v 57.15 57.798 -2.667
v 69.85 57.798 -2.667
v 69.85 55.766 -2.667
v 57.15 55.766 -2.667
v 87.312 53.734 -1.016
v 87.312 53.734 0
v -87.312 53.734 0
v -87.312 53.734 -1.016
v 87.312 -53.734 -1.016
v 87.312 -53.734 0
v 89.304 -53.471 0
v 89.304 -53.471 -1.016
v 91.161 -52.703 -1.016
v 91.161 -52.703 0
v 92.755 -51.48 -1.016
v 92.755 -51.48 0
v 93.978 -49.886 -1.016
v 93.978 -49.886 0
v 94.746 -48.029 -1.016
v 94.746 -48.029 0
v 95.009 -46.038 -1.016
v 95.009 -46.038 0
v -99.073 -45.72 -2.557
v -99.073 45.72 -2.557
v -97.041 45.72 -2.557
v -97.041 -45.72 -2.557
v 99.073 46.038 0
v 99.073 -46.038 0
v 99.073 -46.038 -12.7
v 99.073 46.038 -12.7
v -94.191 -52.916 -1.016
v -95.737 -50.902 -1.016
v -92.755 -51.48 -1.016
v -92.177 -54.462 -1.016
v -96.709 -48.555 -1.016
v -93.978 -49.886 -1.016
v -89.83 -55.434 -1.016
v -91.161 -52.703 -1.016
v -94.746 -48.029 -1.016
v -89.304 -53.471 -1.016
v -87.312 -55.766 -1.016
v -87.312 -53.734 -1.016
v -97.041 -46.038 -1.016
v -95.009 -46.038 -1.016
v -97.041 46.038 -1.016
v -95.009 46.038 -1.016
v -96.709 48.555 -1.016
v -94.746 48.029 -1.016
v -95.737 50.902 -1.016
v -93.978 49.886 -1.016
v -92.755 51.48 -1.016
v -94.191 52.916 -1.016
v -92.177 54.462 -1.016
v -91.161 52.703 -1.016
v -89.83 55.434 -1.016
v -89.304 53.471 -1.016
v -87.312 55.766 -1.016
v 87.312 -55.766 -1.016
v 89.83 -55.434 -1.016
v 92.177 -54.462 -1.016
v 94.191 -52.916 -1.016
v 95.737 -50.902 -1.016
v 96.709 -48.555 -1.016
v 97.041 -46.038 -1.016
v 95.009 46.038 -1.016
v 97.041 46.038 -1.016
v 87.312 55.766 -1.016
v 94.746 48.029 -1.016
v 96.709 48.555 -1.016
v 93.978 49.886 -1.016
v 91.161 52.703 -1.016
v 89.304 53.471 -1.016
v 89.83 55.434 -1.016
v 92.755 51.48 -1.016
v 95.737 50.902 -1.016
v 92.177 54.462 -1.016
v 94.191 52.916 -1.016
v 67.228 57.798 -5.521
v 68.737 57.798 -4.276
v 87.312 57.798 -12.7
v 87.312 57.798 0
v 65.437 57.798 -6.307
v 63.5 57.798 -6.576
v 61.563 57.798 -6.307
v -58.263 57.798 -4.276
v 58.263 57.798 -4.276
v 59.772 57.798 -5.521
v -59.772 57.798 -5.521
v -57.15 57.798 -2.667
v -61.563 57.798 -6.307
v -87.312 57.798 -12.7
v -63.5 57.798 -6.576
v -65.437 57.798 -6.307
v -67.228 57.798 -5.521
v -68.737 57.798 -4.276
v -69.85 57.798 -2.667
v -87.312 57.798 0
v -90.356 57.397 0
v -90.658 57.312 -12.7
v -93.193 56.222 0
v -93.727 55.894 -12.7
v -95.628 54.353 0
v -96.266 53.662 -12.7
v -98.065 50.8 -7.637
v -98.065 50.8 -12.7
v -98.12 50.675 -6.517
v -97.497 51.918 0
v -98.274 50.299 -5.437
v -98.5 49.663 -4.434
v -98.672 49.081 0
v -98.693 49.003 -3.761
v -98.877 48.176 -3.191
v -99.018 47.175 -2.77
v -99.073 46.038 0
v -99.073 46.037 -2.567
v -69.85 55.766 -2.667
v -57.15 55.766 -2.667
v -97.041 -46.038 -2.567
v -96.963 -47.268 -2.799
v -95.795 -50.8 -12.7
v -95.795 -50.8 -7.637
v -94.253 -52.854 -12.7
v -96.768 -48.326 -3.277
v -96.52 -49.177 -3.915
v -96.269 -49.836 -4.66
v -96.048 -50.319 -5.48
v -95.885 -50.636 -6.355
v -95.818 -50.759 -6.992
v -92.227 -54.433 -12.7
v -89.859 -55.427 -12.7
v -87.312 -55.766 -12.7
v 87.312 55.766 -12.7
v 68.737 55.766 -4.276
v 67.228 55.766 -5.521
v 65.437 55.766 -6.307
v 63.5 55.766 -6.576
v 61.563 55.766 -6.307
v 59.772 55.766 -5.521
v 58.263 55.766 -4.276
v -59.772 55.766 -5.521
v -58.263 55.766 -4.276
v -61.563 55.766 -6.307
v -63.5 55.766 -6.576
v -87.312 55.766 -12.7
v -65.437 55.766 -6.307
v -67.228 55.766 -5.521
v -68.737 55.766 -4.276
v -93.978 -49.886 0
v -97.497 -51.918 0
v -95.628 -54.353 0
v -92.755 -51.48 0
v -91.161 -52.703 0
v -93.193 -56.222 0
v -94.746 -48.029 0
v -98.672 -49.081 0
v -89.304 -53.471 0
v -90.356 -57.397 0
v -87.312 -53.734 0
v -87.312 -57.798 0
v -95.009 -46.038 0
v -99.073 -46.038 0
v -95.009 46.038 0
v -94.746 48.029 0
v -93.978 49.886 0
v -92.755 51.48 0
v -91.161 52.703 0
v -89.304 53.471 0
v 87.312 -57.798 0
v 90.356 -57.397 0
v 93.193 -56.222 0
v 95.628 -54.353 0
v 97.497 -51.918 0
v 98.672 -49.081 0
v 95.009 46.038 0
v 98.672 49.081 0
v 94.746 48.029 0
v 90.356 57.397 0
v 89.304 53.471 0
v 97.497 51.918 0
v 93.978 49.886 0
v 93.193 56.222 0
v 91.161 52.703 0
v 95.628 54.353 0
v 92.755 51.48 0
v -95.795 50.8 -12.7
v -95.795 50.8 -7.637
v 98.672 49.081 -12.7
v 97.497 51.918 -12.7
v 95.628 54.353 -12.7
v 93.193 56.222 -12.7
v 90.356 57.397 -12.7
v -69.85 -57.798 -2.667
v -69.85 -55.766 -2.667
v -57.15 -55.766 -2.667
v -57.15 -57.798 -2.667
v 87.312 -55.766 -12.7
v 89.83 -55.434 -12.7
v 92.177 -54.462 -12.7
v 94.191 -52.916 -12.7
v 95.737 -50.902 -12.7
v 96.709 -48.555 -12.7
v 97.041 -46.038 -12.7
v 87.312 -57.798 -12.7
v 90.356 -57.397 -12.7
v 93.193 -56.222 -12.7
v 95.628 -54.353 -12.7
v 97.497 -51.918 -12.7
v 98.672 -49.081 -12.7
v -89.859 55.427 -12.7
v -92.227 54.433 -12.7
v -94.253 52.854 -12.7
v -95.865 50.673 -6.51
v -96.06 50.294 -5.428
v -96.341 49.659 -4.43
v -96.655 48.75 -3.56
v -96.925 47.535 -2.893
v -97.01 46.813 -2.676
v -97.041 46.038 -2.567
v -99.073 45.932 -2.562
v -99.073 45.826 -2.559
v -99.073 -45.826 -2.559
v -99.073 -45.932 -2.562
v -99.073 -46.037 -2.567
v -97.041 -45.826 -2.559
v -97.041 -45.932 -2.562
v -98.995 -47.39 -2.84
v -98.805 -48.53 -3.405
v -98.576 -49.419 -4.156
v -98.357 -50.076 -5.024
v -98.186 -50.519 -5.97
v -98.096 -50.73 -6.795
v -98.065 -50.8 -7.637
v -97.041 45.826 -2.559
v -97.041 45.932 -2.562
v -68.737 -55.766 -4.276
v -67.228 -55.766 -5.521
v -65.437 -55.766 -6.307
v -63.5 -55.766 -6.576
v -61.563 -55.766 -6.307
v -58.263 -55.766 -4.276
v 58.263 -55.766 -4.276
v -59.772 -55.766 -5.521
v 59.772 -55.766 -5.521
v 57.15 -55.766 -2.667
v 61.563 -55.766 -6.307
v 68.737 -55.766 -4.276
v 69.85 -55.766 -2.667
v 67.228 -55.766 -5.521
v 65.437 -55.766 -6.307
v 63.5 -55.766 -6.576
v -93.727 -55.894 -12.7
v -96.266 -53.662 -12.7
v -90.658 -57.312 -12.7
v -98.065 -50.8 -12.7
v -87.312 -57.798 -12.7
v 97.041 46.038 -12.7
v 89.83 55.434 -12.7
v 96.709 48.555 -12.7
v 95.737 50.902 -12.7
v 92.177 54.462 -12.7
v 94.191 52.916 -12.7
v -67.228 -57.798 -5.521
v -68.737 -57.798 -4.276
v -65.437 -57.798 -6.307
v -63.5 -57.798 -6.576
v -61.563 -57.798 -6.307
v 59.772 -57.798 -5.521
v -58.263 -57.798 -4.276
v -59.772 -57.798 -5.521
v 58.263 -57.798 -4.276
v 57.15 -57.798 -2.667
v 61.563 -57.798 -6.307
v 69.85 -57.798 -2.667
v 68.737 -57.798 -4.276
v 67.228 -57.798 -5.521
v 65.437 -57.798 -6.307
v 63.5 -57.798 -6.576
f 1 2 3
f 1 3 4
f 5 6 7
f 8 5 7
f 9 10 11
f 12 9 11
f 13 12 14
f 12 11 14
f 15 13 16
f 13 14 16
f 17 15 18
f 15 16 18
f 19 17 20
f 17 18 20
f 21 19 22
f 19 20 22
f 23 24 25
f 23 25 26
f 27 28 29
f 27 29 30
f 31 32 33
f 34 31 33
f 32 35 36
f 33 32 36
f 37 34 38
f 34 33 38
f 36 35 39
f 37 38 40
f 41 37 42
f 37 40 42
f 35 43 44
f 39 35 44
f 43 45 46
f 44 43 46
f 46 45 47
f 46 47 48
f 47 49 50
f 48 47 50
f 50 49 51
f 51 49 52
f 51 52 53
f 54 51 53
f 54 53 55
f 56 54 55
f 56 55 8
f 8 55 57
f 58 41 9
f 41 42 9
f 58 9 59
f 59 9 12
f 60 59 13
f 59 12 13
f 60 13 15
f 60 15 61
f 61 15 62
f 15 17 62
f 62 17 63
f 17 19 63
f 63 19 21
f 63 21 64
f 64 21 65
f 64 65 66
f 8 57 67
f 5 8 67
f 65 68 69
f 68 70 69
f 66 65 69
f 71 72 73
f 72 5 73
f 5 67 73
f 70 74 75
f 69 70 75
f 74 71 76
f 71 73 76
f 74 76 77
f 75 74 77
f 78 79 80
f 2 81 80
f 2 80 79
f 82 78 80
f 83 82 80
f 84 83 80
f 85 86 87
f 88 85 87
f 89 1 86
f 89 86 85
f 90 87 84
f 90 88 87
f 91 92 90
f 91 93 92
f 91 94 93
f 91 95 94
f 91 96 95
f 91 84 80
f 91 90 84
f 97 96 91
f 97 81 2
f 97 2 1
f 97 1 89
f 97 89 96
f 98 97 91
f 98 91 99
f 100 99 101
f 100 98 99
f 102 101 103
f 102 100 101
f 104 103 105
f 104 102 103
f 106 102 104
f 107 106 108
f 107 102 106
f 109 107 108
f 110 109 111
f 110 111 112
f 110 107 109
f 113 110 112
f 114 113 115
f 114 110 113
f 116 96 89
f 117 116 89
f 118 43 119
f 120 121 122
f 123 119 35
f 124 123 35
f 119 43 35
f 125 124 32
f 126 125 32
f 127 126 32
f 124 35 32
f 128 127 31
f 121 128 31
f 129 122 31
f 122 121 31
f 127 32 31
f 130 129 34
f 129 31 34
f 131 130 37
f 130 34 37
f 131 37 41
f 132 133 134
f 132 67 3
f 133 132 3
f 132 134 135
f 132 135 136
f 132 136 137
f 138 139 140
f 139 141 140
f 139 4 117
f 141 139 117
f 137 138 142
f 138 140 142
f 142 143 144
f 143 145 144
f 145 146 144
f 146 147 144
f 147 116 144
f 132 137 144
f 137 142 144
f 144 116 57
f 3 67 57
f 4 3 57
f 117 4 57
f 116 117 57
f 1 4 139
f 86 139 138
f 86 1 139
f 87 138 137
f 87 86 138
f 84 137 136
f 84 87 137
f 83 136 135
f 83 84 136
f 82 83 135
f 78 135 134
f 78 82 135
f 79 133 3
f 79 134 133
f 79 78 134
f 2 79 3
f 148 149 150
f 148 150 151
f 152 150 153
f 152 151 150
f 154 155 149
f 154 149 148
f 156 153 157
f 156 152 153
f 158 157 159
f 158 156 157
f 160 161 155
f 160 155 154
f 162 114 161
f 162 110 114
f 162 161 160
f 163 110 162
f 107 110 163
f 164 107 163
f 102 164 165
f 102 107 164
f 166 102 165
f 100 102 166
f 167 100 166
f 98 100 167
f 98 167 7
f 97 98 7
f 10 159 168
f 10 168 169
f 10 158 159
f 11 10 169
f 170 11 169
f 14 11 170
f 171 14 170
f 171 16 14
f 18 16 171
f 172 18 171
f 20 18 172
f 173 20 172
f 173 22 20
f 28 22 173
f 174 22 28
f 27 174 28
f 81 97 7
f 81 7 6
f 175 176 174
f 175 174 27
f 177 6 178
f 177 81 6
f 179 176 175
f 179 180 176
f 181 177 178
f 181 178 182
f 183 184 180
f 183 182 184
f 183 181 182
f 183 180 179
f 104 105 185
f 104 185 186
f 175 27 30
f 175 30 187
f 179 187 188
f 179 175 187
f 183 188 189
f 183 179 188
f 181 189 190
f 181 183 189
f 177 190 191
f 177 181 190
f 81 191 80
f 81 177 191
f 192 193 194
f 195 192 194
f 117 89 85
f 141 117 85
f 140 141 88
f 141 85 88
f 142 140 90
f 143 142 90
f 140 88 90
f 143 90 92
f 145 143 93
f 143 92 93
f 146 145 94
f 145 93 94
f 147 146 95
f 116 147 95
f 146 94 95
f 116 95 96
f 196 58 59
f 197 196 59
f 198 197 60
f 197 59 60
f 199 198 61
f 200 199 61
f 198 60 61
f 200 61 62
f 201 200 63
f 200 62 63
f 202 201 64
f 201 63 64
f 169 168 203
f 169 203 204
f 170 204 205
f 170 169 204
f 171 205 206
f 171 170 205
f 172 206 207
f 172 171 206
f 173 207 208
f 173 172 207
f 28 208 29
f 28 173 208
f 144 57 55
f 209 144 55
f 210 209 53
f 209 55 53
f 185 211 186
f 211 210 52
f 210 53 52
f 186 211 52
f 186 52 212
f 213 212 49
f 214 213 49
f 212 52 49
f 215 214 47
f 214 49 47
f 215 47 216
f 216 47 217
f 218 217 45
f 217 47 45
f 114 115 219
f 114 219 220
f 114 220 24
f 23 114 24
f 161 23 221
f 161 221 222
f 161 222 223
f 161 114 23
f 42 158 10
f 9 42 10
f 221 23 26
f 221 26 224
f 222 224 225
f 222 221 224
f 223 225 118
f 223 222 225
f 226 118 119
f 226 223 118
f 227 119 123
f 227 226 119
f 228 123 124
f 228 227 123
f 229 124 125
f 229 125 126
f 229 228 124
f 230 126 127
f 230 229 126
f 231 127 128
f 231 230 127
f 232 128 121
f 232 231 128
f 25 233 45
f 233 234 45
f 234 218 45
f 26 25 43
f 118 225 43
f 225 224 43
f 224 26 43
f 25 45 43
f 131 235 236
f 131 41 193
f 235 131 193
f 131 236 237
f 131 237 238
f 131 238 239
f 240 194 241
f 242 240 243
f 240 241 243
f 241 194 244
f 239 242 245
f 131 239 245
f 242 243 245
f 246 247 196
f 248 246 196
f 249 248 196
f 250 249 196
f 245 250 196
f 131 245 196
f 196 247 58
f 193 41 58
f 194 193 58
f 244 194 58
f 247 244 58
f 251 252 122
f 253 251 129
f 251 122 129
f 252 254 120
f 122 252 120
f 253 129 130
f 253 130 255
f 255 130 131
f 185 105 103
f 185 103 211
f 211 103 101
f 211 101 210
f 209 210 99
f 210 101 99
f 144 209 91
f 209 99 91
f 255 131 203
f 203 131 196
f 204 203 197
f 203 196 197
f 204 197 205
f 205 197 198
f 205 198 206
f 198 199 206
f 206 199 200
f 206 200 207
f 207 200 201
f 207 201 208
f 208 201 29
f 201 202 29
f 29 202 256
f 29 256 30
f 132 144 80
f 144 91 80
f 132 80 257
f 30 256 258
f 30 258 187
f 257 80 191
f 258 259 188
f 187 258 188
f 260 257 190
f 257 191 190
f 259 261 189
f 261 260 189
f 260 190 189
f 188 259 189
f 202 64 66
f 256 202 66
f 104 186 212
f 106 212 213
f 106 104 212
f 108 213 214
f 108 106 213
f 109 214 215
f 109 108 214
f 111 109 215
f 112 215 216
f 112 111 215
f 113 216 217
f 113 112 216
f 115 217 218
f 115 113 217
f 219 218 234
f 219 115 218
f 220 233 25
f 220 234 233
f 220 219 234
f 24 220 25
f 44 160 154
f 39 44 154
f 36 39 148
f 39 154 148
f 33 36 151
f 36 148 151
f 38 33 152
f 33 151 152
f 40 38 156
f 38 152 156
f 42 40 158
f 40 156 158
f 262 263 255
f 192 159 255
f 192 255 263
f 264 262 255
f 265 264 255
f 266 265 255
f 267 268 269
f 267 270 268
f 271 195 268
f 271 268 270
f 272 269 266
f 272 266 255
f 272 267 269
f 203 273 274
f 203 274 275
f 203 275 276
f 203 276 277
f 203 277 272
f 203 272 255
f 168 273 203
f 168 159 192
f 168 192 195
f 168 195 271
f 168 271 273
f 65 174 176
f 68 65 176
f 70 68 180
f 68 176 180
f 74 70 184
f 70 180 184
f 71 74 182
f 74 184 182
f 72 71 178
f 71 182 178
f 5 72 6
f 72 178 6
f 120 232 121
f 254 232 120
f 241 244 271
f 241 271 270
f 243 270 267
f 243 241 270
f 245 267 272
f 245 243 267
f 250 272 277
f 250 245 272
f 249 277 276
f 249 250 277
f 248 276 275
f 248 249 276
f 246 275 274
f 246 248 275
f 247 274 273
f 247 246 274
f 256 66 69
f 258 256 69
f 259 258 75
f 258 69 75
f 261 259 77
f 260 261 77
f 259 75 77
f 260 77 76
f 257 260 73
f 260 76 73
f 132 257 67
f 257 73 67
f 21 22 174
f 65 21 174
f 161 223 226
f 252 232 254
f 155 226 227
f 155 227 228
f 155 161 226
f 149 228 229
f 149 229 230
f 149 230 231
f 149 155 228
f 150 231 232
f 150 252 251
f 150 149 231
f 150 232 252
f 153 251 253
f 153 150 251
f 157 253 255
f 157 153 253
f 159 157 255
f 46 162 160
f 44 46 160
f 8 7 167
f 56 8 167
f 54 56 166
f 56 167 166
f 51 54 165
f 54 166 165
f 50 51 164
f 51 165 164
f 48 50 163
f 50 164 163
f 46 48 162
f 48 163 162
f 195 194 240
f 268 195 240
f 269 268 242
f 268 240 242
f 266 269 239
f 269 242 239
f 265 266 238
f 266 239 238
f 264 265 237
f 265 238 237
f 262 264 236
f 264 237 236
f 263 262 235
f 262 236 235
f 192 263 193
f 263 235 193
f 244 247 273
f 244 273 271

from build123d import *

# Parameters (mm, degrees)
BOSS_EXTRUDE1_DEPTH = 12.7
BOSS_EXTRUDE2_DEPTH = 1.016
CUT_EXTRUDE1_REACH  = 208.793
CUT_EXTRUDE2_DEPTH  = 153.771026153


with BuildPart() as part:
    # Sketch1 → Boss-Extrude1 (new body)
    with BuildSketch(Plane.XY):
        with BuildLine():
            Line((-99.0727, 46.0375), (-99.0727, -46.0375))
            ThreePointArc((-99.0727, -46.0375), (-95.628217168, -54.353217168), (-87.3125, -57.7977))
            Line((-87.3125, -57.7977), (87.3125, -57.7977))
            ThreePointArc((87.3125, -57.7977), (95.628217168, -54.353217168), (99.0727, -46.0375))
            Line((99.0727, -46.0375), (99.0727, 46.0375))
            ThreePointArc((99.0727, 46.0375), (95.628217168, 54.353217168), (87.3125, 57.7977))
            Line((87.3125, 57.7977), (-87.3125, 57.7977))
            ThreePointArc((-87.3125, 57.7977), (-95.628217168, 54.353217168), (-99.0727, 46.0375))
        make_face()
        with BuildLine():
            Line((87.3125, 55.7657), (-87.3125, 55.7657))
            ThreePointArc((-87.3125, 55.7657), (-94.191376189, 52.916376189), (-97.0407, 46.0375))
            Line((-97.0407, 46.0375), (-97.0407, -46.0375))
            ThreePointArc((-97.0407, -46.0375), (-94.191376189, -52.916376189), (-87.3125, -55.7657))
            Line((-87.3125, -55.7657), (87.3125, -55.7657))
            ThreePointArc((87.3125, -55.7657), (94.191376189, -52.916376189), (97.0407, -46.0375))
            Line((97.0407, -46.0375), (97.0407, 46.0375))
            ThreePointArc((97.0407, 46.0375), (94.191376189, 52.916376189), (87.3125, 55.7657))
        make_face(mode=Mode.SUBTRACT)
    extrude(amount=-BOSS_EXTRUDE1_DEPTH)

    # Sketch2 → Boss-Extrude2 (add)
    with BuildSketch(Plane.XY):
        with BuildLine():
            Line((-97.0407, 46.0375), (-97.0407, -46.0375))
            ThreePointArc((-97.0407, -46.0375), (-94.191376189, -52.916376189), (-87.3125, -55.7657))
            Line((-87.3125, -55.7657), (87.3125, -55.7657))
            ThreePointArc((87.3125, -55.7657), (94.191376189, -52.916376189), (97.0407, -46.0375))
            Line((97.0407, -46.0375), (97.0407, 46.0375))
            ThreePointArc((97.0407, 46.0375), (94.191376189, 52.916376189), (87.3125, 55.7657))
            Line((87.3125, 55.7657), (-87.3125, 55.7657))
            ThreePointArc((-87.3125, 55.7657), (-94.191376189, 52.916376189), (-97.0407, 46.0375))
        make_face()
        with BuildLine():
            Line((-95.0087, 46.0375), (-95.0087, -46.0375))
            ThreePointArc((-95.0087, -46.0375), (-92.754535209, -51.479535209), (-87.3125, -53.7337))
            Line((-87.3125, -53.7337), (87.3125, -53.7337))
            ThreePointArc((87.3125, -53.7337), (92.754535209, -51.479535209), (95.0087, -46.0375))
            Line((95.0087, -46.0375), (95.0087, 46.0375))
            ThreePointArc((95.0087, 46.0375), (92.754535209, 51.479535209), (87.3125, 53.7337))
            Line((87.3125, 53.7337), (-87.3125, 53.7337))
            ThreePointArc((-87.3125, 53.7337), (-92.754535209, 51.479535209), (-95.0087, 46.0375))
        make_face(mode=Mode.SUBTRACT)
    extrude(amount=-BOSS_EXTRUDE2_DEPTH)

    # Sketch3 → Cut-Extrude1 (cut, up to next)
    with BuildSketch(Plane.ZY.offset(99.0727), mode=Mode.PRIVATE) as cut_extrude1_sk1:
        with BuildLine():
            Line((-12.7, 50.8), (-7.637414644, 50.8))
            ThreePointArc((-7.637414644, 50.8), (-4.045312196, 49.312102448), (-2.557414644, 45.72))
            Line((-2.557414644, 45.72), (-2.557414644, -45.72))
            ThreePointArc((-2.557414644, -45.72), (-4.045312196, -49.312102448), (-7.637414644, -50.8))
            Line((-7.637414644, -50.8), (-12.7, -50.8))
            Line((-12.7, -50.8), (-12.7, 50.8))
        make_face()
    cut_extrude1_tool1 = extrude(cut_extrude1_sk1.sketch, amount=-CUT_EXTRUDE1_REACH, mode=Mode.PRIVATE) & part.part
    add(cut_extrude1_tool1.solids().sort_by_distance((-99.0727, 0, -7.671479))[0], mode=Mode.SUBTRACT)

    # Sketch4 → Cut-Extrude2 (cut, through all)
    with BuildSketch(Plane(origin=(0, 57.7977, 0), x_dir=(1, 0, 0), z_dir=(0, 1, 0))):
        with BuildLine():
            Line((-69.85, 2.667), (-57.15, 2.667))
            ThreePointArc((-57.15, 2.667), (-63.5, 6.576181866), (-69.85, 2.667))
        make_face()
        with BuildLine():
            Line((69.85, 2.667), (57.15, 2.667))
            ThreePointArc((57.15, 2.667), (63.5, 6.576181866), (69.85, 2.667))
        make_face()
    extrude(amount=-CUT_EXTRUDE2_DEPTH, mode=Mode.SUBTRACT)


solid = part.part
